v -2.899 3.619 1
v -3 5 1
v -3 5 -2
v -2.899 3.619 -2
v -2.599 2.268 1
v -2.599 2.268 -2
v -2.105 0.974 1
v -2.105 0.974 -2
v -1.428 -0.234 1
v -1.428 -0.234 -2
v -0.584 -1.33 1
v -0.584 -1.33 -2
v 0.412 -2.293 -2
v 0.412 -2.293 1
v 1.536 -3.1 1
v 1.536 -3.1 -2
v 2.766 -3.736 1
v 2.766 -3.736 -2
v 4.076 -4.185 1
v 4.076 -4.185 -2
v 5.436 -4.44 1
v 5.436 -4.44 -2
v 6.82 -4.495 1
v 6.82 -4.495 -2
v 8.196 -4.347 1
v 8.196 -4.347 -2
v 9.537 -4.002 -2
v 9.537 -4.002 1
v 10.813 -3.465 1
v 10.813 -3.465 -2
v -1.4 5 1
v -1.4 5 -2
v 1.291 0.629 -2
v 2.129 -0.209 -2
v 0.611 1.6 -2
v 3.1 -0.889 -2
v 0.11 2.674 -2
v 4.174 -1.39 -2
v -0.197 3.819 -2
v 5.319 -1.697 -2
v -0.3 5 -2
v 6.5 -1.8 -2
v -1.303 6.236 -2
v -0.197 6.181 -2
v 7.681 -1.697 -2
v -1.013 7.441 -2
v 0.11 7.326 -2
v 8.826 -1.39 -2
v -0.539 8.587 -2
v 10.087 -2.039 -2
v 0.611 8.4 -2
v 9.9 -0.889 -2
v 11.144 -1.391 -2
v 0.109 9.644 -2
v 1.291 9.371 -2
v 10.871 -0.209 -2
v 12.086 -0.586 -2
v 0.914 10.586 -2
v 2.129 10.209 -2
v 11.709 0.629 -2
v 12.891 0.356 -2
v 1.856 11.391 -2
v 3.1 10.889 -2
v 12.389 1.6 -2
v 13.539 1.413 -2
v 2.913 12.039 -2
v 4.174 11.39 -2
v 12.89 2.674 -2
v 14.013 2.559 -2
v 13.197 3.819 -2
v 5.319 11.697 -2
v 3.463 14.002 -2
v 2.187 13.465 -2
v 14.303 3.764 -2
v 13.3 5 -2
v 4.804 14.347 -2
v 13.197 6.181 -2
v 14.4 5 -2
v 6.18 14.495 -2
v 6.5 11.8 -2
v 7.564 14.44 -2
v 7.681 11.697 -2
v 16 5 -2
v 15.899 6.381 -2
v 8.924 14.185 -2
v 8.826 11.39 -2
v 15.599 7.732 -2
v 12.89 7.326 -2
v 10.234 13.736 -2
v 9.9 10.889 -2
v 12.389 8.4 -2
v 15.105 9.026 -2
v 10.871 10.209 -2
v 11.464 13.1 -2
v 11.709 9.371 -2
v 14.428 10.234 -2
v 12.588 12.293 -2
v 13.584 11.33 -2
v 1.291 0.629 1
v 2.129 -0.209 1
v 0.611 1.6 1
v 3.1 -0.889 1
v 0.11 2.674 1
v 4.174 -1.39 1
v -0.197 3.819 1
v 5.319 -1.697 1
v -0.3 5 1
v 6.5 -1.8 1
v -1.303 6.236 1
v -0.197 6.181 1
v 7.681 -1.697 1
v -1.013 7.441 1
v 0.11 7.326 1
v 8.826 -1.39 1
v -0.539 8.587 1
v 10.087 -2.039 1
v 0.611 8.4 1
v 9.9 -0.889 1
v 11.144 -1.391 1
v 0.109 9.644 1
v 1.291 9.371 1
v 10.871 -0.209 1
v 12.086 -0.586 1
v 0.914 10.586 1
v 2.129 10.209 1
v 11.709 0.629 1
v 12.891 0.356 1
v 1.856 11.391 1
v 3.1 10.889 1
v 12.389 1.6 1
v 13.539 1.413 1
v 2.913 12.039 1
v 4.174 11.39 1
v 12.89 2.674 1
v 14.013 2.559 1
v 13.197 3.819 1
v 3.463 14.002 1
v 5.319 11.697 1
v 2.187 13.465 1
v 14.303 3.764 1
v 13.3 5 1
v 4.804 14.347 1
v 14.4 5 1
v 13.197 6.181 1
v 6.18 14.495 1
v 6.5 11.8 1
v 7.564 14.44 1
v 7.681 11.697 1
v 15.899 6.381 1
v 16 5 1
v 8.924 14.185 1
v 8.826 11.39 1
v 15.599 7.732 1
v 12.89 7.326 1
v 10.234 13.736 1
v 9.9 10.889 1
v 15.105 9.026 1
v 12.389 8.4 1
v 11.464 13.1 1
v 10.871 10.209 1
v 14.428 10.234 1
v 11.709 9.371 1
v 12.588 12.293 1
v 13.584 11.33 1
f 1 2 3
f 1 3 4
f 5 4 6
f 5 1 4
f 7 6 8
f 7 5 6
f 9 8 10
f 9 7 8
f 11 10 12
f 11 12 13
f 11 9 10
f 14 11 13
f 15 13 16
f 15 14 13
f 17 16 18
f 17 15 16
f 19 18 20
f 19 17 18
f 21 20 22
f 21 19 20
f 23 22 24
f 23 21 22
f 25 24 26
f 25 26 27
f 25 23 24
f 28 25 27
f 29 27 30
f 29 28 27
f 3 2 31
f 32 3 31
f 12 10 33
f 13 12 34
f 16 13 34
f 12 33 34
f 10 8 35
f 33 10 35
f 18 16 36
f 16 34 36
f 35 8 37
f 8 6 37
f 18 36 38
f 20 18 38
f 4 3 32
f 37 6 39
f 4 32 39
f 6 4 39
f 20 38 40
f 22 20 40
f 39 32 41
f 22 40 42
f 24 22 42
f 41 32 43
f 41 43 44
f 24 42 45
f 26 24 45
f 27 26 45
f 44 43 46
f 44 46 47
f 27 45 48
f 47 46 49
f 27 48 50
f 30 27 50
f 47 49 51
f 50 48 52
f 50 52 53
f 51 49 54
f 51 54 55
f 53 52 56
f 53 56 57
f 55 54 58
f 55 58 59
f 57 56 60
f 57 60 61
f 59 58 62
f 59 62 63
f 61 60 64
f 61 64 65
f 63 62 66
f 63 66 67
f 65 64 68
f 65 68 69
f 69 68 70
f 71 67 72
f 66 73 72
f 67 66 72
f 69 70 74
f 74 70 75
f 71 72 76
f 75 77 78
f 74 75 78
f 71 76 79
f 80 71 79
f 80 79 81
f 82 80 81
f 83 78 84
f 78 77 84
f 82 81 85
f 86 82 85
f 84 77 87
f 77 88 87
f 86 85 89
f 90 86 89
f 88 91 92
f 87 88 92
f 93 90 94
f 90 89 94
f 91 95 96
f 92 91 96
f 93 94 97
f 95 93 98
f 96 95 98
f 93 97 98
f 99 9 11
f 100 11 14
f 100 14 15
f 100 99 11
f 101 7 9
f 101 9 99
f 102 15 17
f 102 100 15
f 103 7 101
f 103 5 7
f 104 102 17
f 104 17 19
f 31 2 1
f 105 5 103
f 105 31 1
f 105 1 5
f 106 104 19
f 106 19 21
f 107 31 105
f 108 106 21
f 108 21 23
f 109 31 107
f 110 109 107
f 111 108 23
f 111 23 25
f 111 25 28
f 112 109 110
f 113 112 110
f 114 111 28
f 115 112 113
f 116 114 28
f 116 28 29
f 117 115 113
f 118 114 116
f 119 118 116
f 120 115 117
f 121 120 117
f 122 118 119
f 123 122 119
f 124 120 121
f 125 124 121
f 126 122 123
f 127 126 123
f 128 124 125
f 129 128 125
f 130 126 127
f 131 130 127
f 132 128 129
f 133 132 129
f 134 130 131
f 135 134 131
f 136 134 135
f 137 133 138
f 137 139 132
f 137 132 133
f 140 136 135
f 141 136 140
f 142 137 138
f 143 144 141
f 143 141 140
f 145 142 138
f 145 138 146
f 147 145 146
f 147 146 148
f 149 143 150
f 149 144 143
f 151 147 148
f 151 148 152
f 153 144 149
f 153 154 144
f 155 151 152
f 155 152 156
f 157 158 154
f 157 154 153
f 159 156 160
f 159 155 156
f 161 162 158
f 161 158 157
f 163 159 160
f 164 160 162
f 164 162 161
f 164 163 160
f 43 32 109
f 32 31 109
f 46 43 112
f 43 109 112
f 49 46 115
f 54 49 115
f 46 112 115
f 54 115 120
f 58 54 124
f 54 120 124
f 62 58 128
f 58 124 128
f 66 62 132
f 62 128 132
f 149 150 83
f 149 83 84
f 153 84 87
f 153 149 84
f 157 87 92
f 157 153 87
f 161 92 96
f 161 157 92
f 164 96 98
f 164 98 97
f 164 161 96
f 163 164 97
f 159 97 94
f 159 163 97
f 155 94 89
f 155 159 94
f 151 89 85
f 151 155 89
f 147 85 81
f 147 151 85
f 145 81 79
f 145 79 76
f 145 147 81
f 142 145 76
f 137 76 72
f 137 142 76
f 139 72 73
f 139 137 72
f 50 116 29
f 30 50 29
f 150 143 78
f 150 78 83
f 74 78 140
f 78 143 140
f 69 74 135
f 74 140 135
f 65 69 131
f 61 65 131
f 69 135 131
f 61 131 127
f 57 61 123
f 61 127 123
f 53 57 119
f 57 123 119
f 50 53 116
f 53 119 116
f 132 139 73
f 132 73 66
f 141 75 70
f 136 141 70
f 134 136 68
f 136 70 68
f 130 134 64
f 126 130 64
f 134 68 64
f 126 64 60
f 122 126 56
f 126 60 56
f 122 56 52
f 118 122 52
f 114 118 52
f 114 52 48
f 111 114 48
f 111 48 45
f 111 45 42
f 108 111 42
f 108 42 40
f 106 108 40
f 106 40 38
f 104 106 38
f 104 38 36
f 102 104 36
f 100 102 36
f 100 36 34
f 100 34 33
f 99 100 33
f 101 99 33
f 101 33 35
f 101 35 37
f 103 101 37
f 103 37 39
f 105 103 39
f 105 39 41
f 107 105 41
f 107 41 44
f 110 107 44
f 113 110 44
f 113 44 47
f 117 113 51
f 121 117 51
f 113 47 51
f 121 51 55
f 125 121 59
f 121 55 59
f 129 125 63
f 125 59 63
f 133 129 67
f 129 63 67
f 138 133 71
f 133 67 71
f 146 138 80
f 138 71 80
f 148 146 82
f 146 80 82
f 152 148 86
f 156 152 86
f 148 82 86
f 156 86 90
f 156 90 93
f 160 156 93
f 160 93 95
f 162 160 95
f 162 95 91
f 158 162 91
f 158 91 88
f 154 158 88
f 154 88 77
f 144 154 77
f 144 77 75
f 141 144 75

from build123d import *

# Parameters (mm, degrees)
SKETCH009_R     = 9.5
PAD006_DEPTH    = 3
SKETCH010_R     = 6.8
POCKET003_DEPTH = 5
SKETCH013_W     = 1.6
SKETCH013_H     = 3
GROOVE_ANGLE    = -63
SKETCH014_W     = 1.6
SKETCH014_H     = 3
GROOVE001_ANGLE = -63


with BuildPart() as part:
    # Sketch009 → Pad006 (new body)
    with BuildSketch(Plane.XY.offset(1)):
        with Locations((6.5, 5)):
            Circle(SKETCH009_R)
    extrude(amount=-PAD006_DEPTH)

    # Sketch010 (on Face3 of Pad006) → Pocket003 (cut)
    with BuildSketch(Plane(origin=(0, 0, -2), x_dir=(1, 0, 0), z_dir=(0, 0, -1))):
        with Locations((6.5, -5)):
            Circle(SKETCH010_R)
    extrude(amount=-POCKET003_DEPTH, mode=Mode.SUBTRACT)

    # Sketch013 → Groove (revolve, cut)
    with BuildSketch(Plane(origin=(6.5, 5, 0), x_dir=(1, 0, 0), z_dir=(0, -1, 0))):
        with Locations((8.7, -0.5)):
            Rectangle(SKETCH013_W, SKETCH013_H)
    revolve(axis=Axis((6.5, 5, 0), (0, 0, 1)), revolution_arc=GROOVE_ANGLE, mode=Mode.SUBTRACT)

    # Sketch014 → Groove001 (revolve, cut)
    with BuildSketch(Plane(origin=(6.5, 5, 0), x_dir=(1, 0, 0), z_dir=(0, -1, 0))):
        with Locations((-8.7, -0.5)):
            Rectangle(SKETCH014_W, SKETCH014_H)
    revolve(axis=Axis((6.5, 5, 0), (0, 0, 1)), revolution_arc=GROOVE001_ANGLE, mode=Mode.SUBTRACT)


solid = part.part
